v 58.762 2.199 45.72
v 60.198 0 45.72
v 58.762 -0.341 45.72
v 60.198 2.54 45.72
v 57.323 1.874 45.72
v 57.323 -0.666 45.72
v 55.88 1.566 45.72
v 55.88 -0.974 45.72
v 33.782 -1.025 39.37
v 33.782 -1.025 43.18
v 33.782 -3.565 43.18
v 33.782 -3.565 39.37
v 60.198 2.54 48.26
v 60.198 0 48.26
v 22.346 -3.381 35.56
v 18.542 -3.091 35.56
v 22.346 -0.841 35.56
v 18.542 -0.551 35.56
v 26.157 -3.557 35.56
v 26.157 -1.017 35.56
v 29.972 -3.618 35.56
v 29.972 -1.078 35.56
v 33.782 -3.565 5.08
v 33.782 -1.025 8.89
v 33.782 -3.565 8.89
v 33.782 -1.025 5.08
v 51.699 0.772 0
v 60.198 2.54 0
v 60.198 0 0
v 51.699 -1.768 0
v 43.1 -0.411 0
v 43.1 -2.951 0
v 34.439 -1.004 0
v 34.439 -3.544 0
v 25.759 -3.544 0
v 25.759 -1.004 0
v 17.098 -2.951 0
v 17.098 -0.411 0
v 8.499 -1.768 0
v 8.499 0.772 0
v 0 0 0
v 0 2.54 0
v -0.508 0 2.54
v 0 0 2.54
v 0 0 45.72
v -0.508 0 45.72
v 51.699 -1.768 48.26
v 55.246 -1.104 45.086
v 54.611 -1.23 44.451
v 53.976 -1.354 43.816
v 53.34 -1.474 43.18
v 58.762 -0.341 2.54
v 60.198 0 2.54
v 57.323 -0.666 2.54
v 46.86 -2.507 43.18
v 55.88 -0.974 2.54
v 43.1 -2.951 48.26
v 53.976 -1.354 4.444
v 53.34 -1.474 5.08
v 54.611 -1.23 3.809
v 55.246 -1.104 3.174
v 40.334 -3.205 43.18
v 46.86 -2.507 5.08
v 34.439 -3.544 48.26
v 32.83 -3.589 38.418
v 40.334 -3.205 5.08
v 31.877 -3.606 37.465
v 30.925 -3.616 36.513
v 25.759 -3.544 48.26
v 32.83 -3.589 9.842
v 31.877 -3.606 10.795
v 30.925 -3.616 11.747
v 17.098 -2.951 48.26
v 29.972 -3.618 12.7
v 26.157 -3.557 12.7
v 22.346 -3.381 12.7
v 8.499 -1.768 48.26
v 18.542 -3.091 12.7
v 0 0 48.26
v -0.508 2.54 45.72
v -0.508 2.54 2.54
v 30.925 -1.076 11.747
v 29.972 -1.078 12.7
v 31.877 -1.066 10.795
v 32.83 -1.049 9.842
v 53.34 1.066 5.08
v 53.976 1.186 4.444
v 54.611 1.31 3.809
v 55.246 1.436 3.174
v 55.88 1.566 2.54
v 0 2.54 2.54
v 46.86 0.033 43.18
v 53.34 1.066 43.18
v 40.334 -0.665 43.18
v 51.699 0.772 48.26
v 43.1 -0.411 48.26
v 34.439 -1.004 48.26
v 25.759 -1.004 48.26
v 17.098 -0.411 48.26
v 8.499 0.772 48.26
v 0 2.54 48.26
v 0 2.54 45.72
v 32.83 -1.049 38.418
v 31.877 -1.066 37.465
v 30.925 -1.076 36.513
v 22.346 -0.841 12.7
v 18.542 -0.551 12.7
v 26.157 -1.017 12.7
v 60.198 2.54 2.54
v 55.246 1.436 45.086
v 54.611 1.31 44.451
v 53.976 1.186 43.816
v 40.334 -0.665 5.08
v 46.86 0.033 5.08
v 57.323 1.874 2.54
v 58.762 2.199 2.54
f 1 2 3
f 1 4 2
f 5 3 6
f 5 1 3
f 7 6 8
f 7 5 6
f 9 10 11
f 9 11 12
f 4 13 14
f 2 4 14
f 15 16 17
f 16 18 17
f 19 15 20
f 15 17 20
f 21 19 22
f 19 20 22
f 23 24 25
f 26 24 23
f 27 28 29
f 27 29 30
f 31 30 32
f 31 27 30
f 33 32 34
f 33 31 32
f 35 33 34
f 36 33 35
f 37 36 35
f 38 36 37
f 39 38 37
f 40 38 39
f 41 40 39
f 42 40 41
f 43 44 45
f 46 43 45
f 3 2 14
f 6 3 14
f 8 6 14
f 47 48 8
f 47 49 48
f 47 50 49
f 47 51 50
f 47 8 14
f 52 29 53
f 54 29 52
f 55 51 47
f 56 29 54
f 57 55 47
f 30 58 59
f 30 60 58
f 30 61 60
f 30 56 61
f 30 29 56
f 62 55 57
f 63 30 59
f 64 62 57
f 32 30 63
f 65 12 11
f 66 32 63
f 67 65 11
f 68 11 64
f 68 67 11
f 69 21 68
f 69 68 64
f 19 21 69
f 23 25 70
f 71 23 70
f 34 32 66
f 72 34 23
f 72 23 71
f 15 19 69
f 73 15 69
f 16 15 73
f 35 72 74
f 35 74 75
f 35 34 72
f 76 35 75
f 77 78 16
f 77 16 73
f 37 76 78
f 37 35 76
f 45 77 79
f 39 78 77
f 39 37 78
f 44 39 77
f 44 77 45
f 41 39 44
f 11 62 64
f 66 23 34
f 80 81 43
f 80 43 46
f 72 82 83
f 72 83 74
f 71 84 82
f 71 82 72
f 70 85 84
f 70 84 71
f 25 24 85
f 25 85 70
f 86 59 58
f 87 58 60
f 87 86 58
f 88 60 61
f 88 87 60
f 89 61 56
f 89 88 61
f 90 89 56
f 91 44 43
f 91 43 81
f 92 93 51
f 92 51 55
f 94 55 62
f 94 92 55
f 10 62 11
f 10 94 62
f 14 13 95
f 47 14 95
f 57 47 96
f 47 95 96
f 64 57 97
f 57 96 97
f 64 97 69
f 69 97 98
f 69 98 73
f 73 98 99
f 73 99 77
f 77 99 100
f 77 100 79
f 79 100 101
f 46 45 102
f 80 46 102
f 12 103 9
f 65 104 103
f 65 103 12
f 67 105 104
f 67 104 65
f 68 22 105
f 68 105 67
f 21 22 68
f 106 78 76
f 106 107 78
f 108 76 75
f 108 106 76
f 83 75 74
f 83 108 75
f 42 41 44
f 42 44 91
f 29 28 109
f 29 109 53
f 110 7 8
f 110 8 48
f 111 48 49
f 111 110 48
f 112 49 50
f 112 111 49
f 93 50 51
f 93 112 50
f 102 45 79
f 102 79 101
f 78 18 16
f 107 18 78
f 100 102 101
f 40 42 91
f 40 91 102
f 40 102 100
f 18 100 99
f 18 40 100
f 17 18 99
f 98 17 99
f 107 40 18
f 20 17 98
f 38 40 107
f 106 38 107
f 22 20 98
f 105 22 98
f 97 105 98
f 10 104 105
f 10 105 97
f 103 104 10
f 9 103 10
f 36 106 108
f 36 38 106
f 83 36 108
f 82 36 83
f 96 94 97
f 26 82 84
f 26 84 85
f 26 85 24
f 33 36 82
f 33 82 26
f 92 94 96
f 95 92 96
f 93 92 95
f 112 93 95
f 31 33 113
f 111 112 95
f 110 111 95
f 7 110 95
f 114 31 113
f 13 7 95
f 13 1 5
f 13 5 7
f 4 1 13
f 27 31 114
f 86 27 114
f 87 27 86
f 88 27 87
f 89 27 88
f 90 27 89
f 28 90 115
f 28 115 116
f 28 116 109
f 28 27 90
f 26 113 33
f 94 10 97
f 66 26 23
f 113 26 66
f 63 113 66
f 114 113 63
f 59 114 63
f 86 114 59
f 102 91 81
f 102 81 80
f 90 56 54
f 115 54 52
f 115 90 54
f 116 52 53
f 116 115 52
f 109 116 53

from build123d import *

# Parameters (mm, degrees)
BOSS_EXTRUDE1_DEPTH = 48.26
SKETCH4_W           = 41.656
SKETCH4_H           = 22.86
CUT_EXTRUDE1_DEPTH  = 25.4
CUT_EXTRUDE2_DEPTH  = 25.4
SKETCH6_W           = 43.18
SKETCH6_H           = 2.54
BOSS_EXTRUDE2_DEPTH = 0.508
CHAMFER2_SIZE       = 3.048
CHAMFER3_SIZE       = 3.81


with BuildPart() as part:
    # Sketch1 → Boss-Extrude1 (new body)
    with BuildSketch(Plane.XY):
        with BuildLine():
            Line((0, 0), (0, 2.54))
            ThreePointArc((0, 2.54), (30.099, -1.078274453), (60.198, 2.54))
            Line((60.198, 2.54), (60.198, 0))
            ThreePointArc((60.198, 0), (30.099, -3.618274453), (0, 0))
        make_face()
    extrude(amount=BOSS_EXTRUDE1_DEPTH)

    # Sketch4 → Cut-Extrude1 (cut)
    with BuildSketch(Plane(origin=(0, 3.81, 0), x_dir=(1, 0, 0), z_dir=(0, 1, 0))):
        with Locations((39.37, -24.13)):
            Rectangle(SKETCH4_W, SKETCH4_H)
    extrude(amount=-CUT_EXTRUDE1_DEPTH, mode=Mode.SUBTRACT)

    # Sketch5 → Cut-Extrude2 (cut)
    with BuildSketch(Plane(origin=(0, 3.81, 0), x_dir=(1, 0, 0), z_dir=(0, 1, 0))):
        Polygon((33.782, -12.7), (33.782, -5.08), (56.388, -5.08), (56.388, -2.54), (60.198, -2.54), (60.198, -3.81), (60.198, -12.7), align=None)
        Polygon((33.782, -35.56), (60.198, -35.56), (60.198, -45.72), (56.388, -45.72), (56.388, -43.18), (33.782, -43.18), align=None)
    extrude(amount=-CUT_EXTRUDE2_DEPTH, mode=Mode.SUBTRACT)

    # Sketch6 → Boss-Extrude2 (add)
    with BuildSketch(Plane.ZY):
        with Locations((24.13, 1.27)):
            Rectangle(SKETCH6_W, SKETCH6_H)
    extrude(amount=BOSS_EXTRUDE2_DEPTH)

    # Chamfer2
    # the kernel refuses this chamfer: 3.048 mm, written as the material it takes off along each edge
    with BuildSketch(Plane(origin=(56.388, 9.510915582, 43.18), x_dir=(0.02749587661058498, 0, 0.9996219169112968), z_dir=(0, -1, 0))) as chamfer2_piece_1_section:
        Polygon((CHAMFER2_SIZE * 0.999621916911, CHAMFER2_SIZE * 0.0274958766106), (-CHAMFER2_SIZE * 0.0274958766106, CHAMFER2_SIZE * 0.999621916911), (0, 0), align=None)
    chamfer2_piece_1 = extrude(amount=18.216979495, mode=Mode.PRIVATE)
    chamfer2_piece_1 = split(chamfer2_piece_1, bisect_by=Plane(origin=(55.345503153, 0.402425835, 45.72), z_dir=(0, 0, -1)), keep=Keep.TOP, mode=Mode.PRIVATE)
    add(chamfer2_piece_1, mode=Mode.SUBTRACT)
    with BuildSketch(Plane(origin=(56.388, 9.510915582, 5.08), x_dir=(-0.9996219169112968, 0, 0.027495876610586396), z_dir=(0, -1, 0))) as chamfer2_piece_2_section:
        Polygon((CHAMFER2_SIZE * 0.999621916911, CHAMFER2_SIZE * 0.0274958766106), (-CHAMFER2_SIZE * 0.0274958766106, CHAMFER2_SIZE * 0.999621916911), (0, 0), align=None)
    chamfer2_piece_2 = extrude(amount=18.216979495, mode=Mode.PRIVATE)
    chamfer2_piece_2 = split(chamfer2_piece_2, bisect_by=Plane(origin=(55.345503153, 0.402425835, 2.54), z_dir=(0, 0, 1)), keep=Keep.TOP, mode=Mode.PRIVATE)
    add(chamfer2_piece_2, mode=Mode.SUBTRACT)

    # Chamfer3
    chamfer3_edges = [part.edges().sort_by_distance(p)[0] for p in [
        (33.782, -2.29485972, 12.7),
        (33.782, -2.29485972, 35.56),
    ]]
    chamfer(chamfer3_edges, length=CHAMFER3_SIZE)


solid = part.part
